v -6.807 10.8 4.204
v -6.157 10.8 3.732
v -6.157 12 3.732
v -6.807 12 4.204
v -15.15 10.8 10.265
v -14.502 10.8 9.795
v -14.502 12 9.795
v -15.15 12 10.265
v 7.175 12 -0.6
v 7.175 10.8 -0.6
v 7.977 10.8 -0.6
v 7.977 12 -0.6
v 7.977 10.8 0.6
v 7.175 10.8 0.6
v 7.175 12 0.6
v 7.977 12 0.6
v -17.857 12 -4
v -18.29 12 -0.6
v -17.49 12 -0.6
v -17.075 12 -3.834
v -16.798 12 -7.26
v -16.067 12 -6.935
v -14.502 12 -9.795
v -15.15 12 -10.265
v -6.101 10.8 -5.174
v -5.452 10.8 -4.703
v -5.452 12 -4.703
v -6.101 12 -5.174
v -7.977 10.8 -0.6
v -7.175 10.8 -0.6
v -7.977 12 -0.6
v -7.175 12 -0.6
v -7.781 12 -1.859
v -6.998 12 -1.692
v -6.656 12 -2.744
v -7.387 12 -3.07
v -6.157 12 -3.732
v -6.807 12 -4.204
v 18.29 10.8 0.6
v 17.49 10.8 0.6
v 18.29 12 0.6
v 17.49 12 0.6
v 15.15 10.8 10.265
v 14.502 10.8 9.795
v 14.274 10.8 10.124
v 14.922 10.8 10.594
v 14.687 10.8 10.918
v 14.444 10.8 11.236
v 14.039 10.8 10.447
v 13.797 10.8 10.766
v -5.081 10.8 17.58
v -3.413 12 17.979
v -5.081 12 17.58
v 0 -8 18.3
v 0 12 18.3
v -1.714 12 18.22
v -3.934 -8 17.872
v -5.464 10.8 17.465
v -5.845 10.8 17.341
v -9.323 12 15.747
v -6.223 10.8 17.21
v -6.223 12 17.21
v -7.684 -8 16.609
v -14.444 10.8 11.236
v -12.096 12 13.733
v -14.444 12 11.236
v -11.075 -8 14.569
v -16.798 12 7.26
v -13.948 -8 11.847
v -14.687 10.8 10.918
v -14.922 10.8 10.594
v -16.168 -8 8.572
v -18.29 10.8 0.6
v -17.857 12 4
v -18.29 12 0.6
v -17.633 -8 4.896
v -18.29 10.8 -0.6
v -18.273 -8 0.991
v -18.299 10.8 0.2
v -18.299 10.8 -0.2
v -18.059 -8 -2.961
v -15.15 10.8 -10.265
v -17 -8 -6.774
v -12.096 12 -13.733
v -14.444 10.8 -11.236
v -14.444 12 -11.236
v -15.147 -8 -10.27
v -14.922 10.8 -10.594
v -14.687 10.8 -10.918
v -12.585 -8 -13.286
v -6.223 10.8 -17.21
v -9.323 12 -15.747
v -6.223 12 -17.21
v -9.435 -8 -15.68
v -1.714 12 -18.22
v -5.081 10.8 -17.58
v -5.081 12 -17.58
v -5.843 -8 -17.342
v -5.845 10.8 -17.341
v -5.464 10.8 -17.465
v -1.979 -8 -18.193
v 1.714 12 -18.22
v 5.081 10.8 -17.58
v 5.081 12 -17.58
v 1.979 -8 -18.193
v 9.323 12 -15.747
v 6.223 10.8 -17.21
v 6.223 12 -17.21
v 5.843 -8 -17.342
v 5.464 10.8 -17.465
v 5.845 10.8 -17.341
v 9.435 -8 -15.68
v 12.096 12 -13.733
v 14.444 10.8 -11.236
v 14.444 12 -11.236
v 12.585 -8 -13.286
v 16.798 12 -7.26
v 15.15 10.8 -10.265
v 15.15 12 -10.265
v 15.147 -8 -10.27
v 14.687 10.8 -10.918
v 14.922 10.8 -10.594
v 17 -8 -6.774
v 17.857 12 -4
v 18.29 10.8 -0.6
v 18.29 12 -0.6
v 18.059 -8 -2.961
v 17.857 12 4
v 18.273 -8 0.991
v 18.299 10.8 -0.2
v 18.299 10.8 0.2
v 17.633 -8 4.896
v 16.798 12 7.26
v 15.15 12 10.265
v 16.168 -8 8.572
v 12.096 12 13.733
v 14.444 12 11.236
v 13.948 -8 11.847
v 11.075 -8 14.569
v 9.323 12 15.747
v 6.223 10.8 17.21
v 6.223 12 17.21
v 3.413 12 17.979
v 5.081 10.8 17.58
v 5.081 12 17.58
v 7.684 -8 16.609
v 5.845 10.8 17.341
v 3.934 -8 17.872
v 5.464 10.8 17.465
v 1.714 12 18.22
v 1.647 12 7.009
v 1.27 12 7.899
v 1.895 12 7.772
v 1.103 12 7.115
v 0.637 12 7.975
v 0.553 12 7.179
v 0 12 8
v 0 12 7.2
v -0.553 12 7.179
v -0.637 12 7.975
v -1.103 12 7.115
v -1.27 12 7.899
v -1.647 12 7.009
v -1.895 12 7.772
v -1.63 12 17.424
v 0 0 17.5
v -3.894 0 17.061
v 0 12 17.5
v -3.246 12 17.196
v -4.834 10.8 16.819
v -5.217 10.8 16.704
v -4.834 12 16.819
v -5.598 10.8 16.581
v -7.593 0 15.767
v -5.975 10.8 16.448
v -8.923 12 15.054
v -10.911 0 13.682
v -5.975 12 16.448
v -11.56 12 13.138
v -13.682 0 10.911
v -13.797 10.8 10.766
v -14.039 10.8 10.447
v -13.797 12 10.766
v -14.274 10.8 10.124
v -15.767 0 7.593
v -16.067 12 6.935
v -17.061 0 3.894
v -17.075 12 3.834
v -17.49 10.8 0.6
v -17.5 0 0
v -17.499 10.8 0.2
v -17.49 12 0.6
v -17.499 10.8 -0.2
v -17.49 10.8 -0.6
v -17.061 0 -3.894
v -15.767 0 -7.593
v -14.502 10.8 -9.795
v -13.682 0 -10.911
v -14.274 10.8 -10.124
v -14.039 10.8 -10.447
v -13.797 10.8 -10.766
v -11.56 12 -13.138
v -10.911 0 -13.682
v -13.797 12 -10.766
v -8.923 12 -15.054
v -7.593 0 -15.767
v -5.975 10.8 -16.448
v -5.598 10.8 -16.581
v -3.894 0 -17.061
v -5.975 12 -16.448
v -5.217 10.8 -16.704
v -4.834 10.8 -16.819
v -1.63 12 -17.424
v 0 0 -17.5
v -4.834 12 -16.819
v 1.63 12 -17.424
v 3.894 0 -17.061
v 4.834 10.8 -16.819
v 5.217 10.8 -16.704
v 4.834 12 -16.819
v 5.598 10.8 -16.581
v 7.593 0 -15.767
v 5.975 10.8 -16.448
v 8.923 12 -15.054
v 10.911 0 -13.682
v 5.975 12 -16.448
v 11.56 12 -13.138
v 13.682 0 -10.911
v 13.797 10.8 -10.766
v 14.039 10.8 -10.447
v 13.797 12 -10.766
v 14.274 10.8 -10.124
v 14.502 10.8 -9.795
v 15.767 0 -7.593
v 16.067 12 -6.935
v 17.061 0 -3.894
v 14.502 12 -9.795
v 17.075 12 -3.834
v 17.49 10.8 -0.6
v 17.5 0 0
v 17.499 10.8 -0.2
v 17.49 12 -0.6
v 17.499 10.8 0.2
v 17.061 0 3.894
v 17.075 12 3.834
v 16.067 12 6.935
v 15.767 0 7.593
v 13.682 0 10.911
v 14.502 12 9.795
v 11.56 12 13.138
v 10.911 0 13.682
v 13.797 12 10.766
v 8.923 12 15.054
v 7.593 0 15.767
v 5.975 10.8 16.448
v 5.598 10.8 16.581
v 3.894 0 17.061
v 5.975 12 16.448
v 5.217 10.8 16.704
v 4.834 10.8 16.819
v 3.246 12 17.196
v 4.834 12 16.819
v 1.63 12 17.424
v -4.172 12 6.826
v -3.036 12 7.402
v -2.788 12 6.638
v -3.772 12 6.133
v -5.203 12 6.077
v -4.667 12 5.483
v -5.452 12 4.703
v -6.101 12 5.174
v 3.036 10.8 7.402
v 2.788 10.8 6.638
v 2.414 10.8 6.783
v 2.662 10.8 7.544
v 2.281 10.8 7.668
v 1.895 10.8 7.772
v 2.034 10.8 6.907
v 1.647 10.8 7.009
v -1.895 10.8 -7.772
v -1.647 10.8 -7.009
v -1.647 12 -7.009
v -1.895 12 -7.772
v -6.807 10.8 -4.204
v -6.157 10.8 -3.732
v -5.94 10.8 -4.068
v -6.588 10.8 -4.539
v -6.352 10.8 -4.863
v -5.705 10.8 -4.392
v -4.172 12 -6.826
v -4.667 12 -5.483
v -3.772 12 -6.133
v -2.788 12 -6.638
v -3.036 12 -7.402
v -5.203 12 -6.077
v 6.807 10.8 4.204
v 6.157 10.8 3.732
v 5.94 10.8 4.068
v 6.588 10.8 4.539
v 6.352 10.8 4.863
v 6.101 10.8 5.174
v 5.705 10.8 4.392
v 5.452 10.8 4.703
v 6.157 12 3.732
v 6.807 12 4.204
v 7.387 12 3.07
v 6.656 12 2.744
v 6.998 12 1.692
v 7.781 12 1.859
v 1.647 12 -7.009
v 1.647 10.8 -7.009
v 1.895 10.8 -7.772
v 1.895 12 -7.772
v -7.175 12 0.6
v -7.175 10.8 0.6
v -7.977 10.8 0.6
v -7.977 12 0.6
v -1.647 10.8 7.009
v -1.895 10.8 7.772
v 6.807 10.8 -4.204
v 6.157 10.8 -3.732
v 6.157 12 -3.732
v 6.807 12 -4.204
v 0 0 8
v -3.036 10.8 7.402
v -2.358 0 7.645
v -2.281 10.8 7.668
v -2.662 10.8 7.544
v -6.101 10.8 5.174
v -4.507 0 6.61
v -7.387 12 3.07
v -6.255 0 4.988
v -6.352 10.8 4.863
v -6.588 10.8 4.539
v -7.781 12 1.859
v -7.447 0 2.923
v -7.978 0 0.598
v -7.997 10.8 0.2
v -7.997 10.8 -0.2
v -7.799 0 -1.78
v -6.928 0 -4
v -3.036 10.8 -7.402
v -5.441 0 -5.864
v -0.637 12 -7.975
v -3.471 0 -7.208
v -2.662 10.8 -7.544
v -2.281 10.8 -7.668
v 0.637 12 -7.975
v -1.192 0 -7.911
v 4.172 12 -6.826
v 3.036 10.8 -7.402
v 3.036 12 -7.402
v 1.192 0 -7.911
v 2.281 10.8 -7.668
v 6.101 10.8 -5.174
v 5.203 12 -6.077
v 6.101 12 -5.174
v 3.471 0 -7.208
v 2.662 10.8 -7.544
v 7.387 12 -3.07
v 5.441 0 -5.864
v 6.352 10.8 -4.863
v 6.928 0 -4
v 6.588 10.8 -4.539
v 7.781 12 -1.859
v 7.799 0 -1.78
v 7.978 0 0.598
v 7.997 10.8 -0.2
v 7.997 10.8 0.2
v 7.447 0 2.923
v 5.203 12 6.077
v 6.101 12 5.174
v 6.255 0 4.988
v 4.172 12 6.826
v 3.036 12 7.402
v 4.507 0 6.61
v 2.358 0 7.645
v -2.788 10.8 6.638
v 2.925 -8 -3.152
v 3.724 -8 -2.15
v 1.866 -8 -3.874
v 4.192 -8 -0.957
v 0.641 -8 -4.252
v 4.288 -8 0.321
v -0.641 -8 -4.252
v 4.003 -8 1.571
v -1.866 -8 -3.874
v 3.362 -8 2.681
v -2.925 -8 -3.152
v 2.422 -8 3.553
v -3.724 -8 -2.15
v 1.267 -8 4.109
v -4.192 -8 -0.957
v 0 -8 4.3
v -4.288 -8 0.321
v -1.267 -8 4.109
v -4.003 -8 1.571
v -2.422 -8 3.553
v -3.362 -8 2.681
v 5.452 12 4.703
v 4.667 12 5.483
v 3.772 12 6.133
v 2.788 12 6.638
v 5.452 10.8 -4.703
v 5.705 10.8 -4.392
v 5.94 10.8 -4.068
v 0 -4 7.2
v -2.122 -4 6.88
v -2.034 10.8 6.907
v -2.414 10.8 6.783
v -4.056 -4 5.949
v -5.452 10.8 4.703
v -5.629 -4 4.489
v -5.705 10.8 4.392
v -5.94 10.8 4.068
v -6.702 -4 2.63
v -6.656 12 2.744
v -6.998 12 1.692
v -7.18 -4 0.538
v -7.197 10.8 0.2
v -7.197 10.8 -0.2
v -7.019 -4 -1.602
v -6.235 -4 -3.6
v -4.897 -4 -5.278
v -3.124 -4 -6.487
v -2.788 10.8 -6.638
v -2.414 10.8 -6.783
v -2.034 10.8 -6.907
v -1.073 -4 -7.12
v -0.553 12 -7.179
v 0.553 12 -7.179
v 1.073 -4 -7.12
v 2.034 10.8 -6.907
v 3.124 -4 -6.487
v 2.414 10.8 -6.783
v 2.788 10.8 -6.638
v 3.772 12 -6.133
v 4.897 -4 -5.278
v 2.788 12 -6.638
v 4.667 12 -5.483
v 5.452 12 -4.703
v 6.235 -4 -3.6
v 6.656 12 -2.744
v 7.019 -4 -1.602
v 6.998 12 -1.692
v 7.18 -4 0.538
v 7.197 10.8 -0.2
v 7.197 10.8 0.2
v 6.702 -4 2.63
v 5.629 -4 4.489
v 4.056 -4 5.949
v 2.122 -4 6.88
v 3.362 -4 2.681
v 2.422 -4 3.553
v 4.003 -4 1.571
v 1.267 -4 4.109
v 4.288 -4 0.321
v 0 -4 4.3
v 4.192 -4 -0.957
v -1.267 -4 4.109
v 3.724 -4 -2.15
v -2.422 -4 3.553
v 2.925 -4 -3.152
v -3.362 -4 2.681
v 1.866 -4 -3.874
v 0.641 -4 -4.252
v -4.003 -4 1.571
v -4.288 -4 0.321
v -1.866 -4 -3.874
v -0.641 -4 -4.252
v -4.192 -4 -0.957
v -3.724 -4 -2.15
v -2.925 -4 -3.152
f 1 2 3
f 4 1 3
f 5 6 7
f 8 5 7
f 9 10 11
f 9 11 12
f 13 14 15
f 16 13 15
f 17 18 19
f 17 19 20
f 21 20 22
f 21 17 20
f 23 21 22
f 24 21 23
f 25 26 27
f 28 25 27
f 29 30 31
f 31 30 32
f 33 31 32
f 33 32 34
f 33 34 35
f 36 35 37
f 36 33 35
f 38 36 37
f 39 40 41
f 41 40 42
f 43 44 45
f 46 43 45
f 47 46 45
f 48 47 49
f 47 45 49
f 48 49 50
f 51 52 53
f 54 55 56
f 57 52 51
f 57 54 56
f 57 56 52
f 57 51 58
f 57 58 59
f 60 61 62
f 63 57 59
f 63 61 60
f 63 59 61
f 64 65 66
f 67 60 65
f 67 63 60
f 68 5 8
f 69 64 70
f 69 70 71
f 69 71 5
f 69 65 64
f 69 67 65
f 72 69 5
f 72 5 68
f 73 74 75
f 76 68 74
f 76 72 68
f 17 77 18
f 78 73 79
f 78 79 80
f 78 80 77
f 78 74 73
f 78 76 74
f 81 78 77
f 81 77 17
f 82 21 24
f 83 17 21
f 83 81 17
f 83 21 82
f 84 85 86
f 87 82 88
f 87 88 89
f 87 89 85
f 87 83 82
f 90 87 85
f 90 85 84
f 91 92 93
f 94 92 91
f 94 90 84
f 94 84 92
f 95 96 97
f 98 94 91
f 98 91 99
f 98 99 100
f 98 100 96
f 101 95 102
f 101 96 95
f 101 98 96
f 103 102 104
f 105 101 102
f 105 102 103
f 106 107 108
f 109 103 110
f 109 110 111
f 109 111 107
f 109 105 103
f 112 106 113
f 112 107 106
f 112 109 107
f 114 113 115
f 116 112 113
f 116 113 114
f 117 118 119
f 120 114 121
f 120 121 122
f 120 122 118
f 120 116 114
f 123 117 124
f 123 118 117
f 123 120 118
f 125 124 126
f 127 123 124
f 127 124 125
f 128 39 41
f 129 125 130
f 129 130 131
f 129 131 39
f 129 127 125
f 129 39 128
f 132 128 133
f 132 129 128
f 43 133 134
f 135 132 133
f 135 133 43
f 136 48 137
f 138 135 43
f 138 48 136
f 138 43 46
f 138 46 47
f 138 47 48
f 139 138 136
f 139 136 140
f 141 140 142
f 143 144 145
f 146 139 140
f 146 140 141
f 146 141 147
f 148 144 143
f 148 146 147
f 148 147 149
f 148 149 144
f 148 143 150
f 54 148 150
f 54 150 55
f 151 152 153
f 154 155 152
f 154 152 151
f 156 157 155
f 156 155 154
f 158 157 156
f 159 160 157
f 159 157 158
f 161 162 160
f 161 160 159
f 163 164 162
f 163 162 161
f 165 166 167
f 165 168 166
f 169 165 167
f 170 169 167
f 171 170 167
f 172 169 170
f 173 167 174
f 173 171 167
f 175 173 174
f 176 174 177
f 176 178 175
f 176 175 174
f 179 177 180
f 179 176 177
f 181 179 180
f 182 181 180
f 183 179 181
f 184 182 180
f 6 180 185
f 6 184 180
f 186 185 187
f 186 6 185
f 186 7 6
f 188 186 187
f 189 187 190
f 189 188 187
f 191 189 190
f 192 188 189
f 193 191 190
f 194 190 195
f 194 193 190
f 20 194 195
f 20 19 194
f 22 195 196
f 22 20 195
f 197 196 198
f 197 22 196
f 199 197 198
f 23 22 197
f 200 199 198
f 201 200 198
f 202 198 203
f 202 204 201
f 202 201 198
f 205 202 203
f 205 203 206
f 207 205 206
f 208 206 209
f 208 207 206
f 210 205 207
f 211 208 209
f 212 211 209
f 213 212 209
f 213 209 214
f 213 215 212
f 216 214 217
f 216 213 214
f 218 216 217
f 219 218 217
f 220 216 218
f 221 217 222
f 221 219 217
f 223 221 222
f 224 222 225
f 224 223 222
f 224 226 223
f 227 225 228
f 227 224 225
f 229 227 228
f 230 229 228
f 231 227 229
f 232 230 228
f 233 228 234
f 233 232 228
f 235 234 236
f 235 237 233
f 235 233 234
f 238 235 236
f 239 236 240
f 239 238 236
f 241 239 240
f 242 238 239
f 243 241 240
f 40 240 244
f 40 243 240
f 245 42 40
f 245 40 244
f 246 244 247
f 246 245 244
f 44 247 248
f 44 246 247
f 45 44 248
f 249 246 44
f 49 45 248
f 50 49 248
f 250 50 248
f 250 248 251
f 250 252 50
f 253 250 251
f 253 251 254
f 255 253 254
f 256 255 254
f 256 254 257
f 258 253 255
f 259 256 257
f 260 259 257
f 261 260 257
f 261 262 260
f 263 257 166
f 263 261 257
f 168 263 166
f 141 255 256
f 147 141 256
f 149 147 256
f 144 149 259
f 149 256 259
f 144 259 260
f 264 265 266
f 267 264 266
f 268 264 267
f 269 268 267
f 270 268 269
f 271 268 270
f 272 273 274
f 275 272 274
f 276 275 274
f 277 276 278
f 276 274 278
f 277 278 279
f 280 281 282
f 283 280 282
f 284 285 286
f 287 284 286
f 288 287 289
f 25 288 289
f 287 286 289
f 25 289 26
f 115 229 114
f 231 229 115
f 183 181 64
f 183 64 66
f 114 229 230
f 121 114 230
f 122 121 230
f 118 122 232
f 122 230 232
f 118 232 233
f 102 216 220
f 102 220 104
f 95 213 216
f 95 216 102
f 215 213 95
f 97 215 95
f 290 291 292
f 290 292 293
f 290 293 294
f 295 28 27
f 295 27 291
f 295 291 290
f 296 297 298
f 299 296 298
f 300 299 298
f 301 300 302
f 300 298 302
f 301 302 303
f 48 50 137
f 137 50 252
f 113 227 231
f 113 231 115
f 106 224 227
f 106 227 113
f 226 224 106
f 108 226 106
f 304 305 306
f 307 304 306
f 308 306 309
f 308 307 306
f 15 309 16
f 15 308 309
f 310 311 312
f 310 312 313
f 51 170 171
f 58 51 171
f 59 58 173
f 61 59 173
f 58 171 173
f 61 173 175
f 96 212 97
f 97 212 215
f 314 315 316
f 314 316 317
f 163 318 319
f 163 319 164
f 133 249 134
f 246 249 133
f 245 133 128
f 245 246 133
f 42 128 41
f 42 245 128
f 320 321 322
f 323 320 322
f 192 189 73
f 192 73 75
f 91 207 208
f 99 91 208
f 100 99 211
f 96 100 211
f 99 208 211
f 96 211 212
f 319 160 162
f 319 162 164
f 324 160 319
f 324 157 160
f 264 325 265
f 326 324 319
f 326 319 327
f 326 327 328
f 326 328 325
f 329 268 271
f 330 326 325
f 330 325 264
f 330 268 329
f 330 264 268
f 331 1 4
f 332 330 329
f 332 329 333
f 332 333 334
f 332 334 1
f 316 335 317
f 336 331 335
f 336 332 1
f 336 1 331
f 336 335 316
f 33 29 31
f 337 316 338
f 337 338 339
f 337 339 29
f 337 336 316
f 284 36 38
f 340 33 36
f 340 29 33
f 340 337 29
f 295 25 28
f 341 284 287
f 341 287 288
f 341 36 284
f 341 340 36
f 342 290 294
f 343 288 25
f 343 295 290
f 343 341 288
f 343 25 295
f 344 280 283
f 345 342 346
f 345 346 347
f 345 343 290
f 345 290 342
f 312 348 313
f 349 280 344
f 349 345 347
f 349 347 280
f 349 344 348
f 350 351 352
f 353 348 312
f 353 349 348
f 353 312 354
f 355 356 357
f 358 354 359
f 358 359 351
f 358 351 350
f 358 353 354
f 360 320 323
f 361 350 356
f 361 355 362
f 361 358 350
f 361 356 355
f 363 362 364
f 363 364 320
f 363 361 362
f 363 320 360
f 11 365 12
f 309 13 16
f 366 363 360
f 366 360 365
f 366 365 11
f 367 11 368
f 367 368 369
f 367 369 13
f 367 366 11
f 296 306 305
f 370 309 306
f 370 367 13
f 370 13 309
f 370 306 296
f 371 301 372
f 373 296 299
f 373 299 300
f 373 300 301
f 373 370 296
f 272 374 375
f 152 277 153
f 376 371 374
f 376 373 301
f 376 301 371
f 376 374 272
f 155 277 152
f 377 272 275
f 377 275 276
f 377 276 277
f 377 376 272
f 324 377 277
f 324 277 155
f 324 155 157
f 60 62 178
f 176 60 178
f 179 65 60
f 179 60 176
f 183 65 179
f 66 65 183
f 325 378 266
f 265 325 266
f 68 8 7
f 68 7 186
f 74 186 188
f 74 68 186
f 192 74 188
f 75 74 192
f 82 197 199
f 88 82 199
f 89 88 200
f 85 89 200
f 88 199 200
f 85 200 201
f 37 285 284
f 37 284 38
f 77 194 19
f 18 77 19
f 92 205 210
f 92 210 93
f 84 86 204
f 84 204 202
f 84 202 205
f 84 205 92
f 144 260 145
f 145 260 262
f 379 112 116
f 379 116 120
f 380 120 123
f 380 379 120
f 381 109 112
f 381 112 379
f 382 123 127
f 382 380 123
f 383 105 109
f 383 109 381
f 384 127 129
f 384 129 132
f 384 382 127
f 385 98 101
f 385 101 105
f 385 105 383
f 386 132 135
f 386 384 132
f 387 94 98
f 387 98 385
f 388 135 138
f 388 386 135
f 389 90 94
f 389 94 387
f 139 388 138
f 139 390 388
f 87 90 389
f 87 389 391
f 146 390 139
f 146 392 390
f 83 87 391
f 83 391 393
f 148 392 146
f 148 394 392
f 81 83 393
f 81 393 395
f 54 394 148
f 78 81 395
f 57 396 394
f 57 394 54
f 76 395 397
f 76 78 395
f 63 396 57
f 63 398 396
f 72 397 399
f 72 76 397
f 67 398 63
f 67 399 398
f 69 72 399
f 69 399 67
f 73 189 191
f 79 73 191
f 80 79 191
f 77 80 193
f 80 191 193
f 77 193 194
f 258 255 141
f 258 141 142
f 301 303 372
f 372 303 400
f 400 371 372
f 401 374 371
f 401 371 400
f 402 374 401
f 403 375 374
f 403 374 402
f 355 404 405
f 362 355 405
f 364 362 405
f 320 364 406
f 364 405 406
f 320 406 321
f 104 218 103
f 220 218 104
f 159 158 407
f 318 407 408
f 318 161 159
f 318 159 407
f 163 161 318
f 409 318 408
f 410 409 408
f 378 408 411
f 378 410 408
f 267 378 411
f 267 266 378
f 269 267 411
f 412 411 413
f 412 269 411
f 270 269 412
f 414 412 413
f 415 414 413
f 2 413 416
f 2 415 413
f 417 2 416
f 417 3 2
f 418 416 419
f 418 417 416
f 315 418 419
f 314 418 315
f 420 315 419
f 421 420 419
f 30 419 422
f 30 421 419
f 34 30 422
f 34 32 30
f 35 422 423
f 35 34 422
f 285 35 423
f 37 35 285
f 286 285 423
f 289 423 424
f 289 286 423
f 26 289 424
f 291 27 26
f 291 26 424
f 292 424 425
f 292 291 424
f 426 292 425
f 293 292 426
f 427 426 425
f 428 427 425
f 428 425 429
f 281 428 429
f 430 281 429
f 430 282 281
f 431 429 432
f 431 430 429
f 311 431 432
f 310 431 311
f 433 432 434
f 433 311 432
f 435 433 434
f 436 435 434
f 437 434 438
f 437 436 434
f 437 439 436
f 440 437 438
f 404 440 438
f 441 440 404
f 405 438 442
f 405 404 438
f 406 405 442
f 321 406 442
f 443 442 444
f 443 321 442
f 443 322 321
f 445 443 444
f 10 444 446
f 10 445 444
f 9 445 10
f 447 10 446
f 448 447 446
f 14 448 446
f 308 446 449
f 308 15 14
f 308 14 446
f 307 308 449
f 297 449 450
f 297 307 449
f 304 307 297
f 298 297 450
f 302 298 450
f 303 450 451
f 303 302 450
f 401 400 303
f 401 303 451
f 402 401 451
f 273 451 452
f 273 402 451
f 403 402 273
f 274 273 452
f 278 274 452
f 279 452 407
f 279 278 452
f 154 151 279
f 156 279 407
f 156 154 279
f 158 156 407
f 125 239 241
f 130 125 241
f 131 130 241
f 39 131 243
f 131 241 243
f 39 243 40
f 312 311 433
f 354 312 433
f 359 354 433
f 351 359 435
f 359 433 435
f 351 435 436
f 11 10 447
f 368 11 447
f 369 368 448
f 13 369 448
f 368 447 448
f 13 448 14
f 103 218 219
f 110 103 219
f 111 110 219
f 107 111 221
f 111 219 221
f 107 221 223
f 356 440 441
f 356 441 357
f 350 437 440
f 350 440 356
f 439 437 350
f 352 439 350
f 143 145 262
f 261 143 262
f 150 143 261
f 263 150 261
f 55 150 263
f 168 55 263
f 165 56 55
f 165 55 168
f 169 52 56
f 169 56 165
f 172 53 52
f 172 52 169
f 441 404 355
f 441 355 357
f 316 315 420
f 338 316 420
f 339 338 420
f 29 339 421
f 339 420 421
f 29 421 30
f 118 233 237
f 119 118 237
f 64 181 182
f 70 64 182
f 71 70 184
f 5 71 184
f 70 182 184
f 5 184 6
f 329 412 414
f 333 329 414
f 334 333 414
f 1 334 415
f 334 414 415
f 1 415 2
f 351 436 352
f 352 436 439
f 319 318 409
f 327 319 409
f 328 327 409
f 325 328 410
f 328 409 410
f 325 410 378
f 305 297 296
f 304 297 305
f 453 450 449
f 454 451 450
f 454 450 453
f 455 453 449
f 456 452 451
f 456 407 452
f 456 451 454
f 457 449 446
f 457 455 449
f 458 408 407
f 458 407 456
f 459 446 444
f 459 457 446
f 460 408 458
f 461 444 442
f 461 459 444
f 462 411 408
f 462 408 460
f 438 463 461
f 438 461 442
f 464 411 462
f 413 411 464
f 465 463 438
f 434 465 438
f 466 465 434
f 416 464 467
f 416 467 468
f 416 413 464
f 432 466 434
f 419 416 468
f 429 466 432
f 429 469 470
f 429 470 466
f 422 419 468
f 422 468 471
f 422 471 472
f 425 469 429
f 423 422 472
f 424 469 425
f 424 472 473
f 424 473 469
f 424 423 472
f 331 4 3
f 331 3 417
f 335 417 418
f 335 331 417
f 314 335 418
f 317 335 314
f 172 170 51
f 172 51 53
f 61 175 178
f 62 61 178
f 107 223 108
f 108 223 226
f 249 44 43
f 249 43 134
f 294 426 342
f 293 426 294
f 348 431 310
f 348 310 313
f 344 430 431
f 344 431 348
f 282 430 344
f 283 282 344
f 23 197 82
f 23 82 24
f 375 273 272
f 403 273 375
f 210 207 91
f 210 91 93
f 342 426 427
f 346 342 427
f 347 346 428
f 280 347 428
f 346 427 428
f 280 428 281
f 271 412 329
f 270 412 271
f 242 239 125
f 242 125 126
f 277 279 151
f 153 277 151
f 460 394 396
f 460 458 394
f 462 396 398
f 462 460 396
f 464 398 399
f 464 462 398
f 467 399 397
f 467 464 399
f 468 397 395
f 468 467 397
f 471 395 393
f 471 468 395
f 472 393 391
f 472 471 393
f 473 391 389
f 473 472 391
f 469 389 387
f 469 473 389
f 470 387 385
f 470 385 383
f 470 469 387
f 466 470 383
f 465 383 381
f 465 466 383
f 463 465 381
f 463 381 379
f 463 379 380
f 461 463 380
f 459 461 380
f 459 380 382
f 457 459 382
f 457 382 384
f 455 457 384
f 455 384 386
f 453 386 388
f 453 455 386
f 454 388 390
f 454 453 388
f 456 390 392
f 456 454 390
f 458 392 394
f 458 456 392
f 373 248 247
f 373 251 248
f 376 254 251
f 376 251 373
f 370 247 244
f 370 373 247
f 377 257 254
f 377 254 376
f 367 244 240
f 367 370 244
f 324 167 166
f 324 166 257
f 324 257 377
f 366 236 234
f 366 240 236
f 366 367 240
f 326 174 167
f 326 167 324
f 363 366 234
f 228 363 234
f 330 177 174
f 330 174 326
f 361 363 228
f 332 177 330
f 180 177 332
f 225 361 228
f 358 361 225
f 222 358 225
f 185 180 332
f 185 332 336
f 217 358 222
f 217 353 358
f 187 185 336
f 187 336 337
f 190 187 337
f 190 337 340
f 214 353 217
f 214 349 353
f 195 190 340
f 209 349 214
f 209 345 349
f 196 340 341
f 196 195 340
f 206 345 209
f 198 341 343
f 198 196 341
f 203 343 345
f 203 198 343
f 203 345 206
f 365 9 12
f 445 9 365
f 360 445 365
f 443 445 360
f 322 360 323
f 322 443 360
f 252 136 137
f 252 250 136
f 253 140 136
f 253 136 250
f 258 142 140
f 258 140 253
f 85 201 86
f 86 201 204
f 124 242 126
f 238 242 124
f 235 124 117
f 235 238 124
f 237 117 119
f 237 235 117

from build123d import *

# Parameters (mm, degrees)
SKETCH4_W          = 1.2
SKETCH4_H          = 1.2
CUT_EXTRUDE2_DEPTH = 29.526829477
CIRPATTERN1_COUNT  = 10


with BuildPart() as part:
    # Sketch1 → Revolve1 (revolve)
    with BuildSketch(Plane.XY, mode=Mode.PRIVATE) as revolve1_sk:
        Polygon((-7.2, -4), (-7.2, 12), (-8, 12), (-8, 0), (-17.5, 0), (-17.5, 12), (-18.3, 12), (-18.3, -8), (-4.3, -8), (-4.3, -4), align=None)
    revolve(revolve1_sk.sketch.rotate(Axis((0, 0, 0), (0, -1, 0)), 270), axis=Axis((0, 0, 0), (0, -1, 0)))

    # Sketch4 → Cut-Extrude2 (cut, through all)
    with BuildSketch(Plane(origin=(0, 0, 0), x_dir=(0, 0, -1), z_dir=(1, 0, 0))):
        with Locations((0, 11.4)):
            Rectangle(SKETCH4_W, SKETCH4_H)
    cut_extrude2 = extrude(amount=-CUT_EXTRUDE2_DEPTH, mode=Mode.SUBTRACT)

    # CirPattern1: Cut-Extrude2 ×10 about axis
    cirpattern1_axis = Axis((0, 0, 0), (0, 1, 0))
    for i in range(1, CIRPATTERN1_COUNT):
        add(cut_extrude2.rotate(cirpattern1_axis, i * 360 / CIRPATTERN1_COUNT), mode=Mode.SUBTRACT)


solid = part.part
